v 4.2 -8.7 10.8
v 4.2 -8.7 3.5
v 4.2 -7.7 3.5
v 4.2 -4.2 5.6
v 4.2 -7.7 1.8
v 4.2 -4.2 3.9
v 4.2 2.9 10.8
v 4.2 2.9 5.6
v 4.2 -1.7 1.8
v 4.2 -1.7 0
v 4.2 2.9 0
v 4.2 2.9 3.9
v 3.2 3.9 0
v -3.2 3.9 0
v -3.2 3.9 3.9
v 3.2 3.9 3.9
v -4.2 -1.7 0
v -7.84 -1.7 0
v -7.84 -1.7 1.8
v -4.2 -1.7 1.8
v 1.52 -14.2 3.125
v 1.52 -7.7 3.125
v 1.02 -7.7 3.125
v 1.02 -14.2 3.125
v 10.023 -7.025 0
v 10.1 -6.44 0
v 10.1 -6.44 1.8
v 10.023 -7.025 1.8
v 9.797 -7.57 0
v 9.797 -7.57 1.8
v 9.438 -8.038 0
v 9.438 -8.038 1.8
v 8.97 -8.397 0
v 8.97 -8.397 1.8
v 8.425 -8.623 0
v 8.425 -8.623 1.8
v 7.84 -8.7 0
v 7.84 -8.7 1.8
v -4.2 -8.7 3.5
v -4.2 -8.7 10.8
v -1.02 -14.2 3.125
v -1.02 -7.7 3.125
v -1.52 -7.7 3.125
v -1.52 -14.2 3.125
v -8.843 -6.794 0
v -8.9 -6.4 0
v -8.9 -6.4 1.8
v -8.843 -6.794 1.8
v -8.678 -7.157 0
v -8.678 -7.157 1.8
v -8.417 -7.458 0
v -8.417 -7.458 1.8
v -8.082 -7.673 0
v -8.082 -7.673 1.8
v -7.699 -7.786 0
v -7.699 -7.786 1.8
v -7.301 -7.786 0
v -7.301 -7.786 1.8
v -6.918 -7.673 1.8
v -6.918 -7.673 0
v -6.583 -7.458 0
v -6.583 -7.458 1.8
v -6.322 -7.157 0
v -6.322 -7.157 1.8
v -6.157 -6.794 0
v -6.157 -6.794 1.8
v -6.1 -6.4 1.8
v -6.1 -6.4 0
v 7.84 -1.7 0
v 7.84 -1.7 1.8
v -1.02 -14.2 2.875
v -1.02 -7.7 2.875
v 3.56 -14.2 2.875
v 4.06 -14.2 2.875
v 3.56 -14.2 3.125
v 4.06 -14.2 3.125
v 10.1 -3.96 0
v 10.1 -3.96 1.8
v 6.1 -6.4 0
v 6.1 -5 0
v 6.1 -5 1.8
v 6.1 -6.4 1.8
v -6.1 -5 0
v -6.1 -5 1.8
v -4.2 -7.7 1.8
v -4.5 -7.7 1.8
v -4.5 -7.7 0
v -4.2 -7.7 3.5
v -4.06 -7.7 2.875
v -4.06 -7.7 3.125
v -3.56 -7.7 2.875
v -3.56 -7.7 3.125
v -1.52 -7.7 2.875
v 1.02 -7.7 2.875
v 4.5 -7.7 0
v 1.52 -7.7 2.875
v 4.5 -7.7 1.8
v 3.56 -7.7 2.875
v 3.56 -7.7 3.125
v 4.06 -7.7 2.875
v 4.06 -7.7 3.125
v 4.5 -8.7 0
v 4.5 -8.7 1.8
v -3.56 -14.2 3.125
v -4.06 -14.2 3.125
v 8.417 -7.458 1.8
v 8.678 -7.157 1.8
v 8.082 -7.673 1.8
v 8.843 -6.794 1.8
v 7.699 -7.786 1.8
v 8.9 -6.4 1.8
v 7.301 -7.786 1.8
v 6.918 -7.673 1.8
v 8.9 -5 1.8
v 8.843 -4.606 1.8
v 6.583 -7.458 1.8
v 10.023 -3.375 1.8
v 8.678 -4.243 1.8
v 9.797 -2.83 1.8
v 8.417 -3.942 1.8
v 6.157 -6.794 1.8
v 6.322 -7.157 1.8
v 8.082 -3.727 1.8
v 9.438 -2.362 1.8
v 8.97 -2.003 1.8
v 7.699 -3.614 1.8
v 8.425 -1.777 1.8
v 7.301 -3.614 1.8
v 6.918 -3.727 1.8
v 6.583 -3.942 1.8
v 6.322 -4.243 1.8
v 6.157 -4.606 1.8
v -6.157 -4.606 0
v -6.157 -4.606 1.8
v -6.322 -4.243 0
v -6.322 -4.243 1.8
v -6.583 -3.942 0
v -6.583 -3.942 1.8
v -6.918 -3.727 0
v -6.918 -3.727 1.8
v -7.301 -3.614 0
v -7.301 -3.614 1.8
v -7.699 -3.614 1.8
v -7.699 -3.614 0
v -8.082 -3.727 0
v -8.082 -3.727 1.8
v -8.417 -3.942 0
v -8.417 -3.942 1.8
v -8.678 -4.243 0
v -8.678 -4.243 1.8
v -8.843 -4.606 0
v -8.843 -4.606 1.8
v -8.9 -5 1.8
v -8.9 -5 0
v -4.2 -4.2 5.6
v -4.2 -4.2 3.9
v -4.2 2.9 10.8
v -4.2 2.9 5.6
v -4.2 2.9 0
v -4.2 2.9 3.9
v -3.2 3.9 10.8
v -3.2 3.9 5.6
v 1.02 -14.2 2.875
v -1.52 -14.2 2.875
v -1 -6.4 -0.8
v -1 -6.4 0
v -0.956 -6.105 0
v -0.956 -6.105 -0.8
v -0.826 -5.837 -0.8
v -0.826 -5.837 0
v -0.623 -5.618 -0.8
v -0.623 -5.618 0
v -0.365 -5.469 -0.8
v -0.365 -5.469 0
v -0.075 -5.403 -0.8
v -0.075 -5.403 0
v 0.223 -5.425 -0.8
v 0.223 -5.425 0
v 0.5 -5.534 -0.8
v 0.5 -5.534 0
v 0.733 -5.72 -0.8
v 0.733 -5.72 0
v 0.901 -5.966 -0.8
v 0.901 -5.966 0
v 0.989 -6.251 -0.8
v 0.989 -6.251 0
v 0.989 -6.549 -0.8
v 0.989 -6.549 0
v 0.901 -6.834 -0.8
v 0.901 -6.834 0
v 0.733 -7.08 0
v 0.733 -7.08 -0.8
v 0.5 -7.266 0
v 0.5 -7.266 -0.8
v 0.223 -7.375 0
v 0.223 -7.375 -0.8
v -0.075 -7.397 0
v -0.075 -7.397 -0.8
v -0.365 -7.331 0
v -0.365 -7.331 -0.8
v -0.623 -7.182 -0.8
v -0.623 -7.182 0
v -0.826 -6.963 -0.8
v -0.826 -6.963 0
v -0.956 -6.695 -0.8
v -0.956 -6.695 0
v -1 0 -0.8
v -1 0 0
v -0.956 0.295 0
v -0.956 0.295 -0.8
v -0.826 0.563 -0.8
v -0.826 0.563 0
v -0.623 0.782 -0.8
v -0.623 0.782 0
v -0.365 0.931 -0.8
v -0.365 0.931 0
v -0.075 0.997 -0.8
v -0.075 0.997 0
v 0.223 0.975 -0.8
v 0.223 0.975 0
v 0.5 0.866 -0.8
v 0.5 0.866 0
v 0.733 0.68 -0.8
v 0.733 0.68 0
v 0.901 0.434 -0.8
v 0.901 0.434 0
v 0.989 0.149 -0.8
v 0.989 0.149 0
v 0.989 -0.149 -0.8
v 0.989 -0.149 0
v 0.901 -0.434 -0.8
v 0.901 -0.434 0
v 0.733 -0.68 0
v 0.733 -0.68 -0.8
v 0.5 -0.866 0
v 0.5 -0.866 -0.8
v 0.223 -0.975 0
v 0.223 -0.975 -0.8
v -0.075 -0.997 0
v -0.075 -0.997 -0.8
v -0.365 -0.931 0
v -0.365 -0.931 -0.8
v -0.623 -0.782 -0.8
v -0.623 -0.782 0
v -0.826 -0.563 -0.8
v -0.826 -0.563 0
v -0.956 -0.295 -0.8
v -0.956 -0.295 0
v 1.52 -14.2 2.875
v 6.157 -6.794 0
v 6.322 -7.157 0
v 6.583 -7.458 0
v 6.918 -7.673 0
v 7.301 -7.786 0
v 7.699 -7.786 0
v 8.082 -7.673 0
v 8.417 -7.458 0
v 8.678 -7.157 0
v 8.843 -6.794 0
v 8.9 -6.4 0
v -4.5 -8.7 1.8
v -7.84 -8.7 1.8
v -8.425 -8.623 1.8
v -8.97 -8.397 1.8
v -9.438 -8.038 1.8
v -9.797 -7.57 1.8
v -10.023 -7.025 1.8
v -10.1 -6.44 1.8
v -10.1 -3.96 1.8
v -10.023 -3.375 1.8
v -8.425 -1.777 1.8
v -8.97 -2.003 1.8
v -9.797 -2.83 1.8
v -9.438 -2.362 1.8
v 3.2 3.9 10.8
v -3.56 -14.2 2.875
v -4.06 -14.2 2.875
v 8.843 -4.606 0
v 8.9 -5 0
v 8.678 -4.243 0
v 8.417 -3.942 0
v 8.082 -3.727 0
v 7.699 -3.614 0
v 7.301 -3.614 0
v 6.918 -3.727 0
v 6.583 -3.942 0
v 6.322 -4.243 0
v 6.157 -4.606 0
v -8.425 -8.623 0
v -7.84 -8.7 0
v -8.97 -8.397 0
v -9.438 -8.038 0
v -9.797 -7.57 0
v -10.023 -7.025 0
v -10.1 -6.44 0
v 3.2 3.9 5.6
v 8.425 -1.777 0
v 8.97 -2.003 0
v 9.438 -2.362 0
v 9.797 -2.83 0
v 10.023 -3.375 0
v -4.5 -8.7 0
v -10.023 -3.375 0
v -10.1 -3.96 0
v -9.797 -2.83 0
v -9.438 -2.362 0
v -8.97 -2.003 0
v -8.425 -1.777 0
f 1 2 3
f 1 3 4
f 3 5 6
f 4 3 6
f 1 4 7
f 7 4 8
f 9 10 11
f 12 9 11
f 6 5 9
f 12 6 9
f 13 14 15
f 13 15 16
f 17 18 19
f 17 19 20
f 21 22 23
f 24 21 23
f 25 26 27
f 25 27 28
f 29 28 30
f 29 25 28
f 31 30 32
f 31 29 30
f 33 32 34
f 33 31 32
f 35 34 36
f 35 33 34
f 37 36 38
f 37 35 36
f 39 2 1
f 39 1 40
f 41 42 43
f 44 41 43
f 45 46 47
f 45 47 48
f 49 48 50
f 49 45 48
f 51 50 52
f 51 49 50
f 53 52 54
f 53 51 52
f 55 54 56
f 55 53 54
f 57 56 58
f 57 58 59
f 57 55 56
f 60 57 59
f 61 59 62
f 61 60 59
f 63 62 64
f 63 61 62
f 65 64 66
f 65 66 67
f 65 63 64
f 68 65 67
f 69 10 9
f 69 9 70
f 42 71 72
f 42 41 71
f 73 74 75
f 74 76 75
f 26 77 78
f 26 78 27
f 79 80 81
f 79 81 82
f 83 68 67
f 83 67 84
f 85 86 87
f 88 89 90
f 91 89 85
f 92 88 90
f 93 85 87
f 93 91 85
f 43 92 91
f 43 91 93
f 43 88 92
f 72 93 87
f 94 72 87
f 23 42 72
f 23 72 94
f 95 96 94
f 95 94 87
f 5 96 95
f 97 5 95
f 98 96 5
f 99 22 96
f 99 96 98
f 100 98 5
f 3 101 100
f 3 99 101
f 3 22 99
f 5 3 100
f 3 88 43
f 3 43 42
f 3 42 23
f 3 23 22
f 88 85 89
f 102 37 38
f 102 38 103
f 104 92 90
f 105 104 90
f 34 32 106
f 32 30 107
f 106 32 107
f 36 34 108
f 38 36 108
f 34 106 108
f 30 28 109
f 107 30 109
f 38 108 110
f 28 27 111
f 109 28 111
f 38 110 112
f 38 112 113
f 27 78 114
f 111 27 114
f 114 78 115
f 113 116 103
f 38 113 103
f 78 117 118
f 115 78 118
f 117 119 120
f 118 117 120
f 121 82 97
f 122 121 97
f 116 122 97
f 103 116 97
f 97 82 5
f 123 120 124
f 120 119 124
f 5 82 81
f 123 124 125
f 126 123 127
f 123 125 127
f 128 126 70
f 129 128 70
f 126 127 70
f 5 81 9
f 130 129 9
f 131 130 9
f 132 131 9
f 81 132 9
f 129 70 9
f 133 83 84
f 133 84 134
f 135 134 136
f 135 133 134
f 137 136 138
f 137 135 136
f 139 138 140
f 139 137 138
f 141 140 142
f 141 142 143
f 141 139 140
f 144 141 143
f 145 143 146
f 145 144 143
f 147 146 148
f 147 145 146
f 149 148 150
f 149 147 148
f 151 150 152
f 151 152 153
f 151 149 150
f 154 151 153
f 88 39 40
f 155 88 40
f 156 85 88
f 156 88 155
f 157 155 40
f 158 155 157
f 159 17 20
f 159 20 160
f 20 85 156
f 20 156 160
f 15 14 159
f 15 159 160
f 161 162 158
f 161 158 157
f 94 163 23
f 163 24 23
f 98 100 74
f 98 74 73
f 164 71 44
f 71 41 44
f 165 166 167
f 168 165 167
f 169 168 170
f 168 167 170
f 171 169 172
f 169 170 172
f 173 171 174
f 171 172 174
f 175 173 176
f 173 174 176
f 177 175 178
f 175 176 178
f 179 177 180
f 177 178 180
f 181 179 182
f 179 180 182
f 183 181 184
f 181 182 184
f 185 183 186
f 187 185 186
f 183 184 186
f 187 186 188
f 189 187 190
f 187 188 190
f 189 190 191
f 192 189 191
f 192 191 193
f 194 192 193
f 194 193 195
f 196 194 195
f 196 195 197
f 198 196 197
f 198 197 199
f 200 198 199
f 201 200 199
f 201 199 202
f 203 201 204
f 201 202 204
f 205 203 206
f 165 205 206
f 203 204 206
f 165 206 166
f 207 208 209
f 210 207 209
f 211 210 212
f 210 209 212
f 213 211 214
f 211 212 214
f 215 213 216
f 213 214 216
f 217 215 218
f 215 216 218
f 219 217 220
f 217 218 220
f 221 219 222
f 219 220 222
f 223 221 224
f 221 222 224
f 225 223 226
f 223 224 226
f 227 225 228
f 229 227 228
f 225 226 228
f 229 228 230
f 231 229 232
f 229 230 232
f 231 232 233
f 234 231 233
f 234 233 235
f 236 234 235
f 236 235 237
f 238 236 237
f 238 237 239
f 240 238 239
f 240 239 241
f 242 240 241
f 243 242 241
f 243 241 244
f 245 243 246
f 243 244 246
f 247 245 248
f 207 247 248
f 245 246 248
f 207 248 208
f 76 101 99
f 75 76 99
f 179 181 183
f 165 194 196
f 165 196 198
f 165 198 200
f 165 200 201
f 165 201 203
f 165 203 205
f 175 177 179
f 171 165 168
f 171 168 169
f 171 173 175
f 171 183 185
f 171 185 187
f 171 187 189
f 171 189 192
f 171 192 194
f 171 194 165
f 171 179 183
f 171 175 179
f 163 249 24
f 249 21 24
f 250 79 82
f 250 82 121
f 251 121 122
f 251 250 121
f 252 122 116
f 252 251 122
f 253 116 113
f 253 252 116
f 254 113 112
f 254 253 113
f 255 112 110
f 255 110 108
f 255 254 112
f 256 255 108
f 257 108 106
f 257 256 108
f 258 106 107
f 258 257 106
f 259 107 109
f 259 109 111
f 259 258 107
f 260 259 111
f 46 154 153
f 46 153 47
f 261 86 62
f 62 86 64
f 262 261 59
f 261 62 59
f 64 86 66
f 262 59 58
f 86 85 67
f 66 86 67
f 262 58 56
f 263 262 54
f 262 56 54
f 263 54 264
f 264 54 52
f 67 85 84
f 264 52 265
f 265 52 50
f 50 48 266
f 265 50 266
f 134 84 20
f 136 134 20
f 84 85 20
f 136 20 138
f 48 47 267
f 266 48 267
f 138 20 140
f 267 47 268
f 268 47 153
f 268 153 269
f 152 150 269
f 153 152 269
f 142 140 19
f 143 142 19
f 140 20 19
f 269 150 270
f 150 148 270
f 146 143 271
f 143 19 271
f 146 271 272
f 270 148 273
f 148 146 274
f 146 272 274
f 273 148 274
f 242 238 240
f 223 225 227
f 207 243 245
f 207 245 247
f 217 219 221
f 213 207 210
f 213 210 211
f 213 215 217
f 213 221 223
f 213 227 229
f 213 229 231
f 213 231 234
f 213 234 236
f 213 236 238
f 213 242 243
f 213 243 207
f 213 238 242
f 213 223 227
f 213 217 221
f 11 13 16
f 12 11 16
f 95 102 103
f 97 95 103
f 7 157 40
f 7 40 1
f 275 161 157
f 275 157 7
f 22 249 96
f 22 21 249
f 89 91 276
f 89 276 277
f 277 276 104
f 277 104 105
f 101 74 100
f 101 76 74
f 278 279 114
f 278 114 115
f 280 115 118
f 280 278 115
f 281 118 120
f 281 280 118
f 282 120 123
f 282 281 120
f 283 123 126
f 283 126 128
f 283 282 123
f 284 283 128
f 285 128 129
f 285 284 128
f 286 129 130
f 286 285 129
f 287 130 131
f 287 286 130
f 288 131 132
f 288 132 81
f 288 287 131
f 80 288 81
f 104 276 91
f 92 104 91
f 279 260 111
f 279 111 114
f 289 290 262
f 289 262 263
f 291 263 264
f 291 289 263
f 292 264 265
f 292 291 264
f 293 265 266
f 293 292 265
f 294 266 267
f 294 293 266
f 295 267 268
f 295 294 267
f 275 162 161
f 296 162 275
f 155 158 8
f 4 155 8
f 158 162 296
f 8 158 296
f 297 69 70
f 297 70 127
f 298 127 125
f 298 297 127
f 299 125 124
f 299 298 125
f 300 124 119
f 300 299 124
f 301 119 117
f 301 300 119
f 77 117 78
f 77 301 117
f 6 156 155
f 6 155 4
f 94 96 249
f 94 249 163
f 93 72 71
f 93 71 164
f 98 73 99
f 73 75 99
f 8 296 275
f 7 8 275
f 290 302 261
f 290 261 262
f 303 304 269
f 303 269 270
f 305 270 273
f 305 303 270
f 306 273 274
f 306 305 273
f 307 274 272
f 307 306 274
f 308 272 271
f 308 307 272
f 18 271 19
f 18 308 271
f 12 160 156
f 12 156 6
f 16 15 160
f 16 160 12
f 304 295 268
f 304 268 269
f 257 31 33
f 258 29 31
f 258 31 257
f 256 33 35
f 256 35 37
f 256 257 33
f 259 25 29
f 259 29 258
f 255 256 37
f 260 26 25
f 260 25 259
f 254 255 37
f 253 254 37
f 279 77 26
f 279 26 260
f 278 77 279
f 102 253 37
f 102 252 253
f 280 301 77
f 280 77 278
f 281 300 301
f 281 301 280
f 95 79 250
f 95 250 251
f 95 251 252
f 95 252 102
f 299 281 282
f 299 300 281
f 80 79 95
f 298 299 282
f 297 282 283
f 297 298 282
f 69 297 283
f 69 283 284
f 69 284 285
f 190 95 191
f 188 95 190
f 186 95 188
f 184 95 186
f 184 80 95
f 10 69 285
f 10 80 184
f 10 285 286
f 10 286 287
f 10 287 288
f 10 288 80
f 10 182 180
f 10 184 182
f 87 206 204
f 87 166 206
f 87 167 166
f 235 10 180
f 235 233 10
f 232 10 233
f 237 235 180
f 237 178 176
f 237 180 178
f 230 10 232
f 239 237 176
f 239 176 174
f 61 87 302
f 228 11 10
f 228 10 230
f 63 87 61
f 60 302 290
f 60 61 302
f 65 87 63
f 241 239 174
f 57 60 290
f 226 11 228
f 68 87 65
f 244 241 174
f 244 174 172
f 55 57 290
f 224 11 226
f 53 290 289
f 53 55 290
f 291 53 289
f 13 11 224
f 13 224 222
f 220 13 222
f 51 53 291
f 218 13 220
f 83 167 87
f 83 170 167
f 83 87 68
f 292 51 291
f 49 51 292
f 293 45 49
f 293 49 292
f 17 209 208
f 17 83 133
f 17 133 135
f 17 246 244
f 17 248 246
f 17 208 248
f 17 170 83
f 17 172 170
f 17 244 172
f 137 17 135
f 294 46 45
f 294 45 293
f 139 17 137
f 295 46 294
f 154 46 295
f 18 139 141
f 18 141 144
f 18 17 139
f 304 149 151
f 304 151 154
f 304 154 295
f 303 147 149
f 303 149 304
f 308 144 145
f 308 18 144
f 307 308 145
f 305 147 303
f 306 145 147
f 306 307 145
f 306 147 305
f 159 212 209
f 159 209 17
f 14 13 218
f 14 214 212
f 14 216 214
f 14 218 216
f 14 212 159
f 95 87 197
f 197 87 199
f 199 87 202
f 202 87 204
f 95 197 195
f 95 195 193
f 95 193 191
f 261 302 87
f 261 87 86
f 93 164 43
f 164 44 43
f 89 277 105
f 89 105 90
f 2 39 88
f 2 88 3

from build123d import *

# Parameters (mm, degrees)
SKETCH1_W           = 8.4
SKETCH1_H           = 12.6
BOSS_EXTRUDE1_DEPTH = 10.8
CHAMFER1_SIZE       = 1
BOSS_EXTRUDE2_DEPTH = 1.8
SKETCH3_W           = 8.4
SKETCH3_H           = 1.7
CUT_EXTRUDE1_DEPTH  = 8.1
SKETCH4_R           = 1
BOSS_EXTRUDE3_DEPTH = 0.8
SKETCH5_W           = 9
SKETCH5_H           = 3.5
CUT_EXTRUDE2_DEPTH  = 1
SKETCH6_W           = 0.5
SKETCH6_H           = 6.5
BOSS_EXTRUDE4_DEPTH = 0.125


with BuildPart() as part:
    # Sketch1 → Boss-Extrude1 (new body)
    with BuildSketch(Plane.XY):
        with Locations((0, -2.4)):
            Rectangle(SKETCH1_W, SKETCH1_H)
    extrude(amount=BOSS_EXTRUDE1_DEPTH)

    # Chamfer1
    chamfer1_edges = [part.edges().sort_by_distance(p)[0] for p in [
        (-4.2, 3.9, 5.4),
        (4.2, 3.9, 5.4),
    ]]
    chamfer(chamfer1_edges, length=CHAMFER1_SIZE)

    # Sketch2 → Boss-Extrude2 (add)
    with BuildSketch(Plane(origin=(0, 0, 0), x_dir=(-1, 0, 0), z_dir=(0, 0, -1))):
        with BuildLine():
            Line((-7.84, -8.7), (7.84, -8.7))
            ThreePointArc((7.84, -8.7), (9.438061325, -8.038061325), (10.1, -6.44))
            Line((10.1, -6.44), (10.1, -3.96))
            ThreePointArc((10.1, -3.96), (9.438061325, -2.361938675), (7.84, -1.7))
            Line((7.84, -1.7), (-7.84, -1.7))
            ThreePointArc((-7.84, -1.7), (-9.438061325, -2.361938675), (-10.1, -3.96))
            Line((-10.1, -3.96), (-10.1, -6.44))
            ThreePointArc((-10.1, -6.44), (-9.438061325, -8.038061325), (-7.84, -8.7))
        make_face()
        with BuildLine():
            Line((-6.1, -5), (-6.1, -6.4))
            ThreePointArc((-6.1, -6.4), (-7.5, -7.8), (-8.9, -6.4))
            Line((-8.9, -6.4), (-8.9, -5))
            ThreePointArc((-8.9, -5), (-7.5, -3.6), (-6.1, -5))
        make_face(mode=Mode.SUBTRACT)
        with BuildLine():
            Line((8.9, -5), (8.9, -6.4))
            ThreePointArc((8.9, -6.4), (7.5, -7.8), (6.1, -6.4))
            Line((6.1, -6.4), (6.1, -5))
            ThreePointArc((6.1, -5), (7.5, -3.6), (8.9, -5))
        make_face(mode=Mode.SUBTRACT)
    extrude(amount=-BOSS_EXTRUDE2_DEPTH)

    # Sketch3 → Cut-Extrude1 (cut)
    with BuildSketch(Plane(origin=(0, 3.9, 0), x_dir=(1, 0, 0), z_dir=(0, 1, 0))):
        with Locations((0, -4.75)):
            Rectangle(SKETCH3_W, SKETCH3_H)
    extrude(amount=-CUT_EXTRUDE1_DEPTH, mode=Mode.SUBTRACT)

    # Sketch4 → Boss-Extrude3 (add)
    with BuildSketch(Plane(origin=(0, 0, 0), x_dir=(-1, 0, 0), z_dir=(0, 0, -1))):
        Circle(SKETCH4_R)
        with Locations((0, -6.4)):
            Circle(SKETCH4_R)
    extrude(amount=BOSS_EXTRUDE3_DEPTH)

    # Sketch5 → Cut-Extrude2 (cut)
    with BuildSketch(Plane.XZ.offset(8.7)):
        with Locations((0, 1.75)):
            Rectangle(SKETCH5_W, SKETCH5_H)
    extrude(amount=-CUT_EXTRUDE2_DEPTH, mode=Mode.SUBTRACT)

    # Sketch6 → Boss-Extrude4 (add, symmetric)
    with BuildSketch(Plane(origin=(0, 0, 3), x_dir=(-1, 0, 0), z_dir=(0, 0, -1))):
        with Locations((-3.81, -10.95)):
            Rectangle(SKETCH6_W, SKETCH6_H)
        with Locations((-1.27, -10.95)):
            Rectangle(SKETCH6_W, SKETCH6_H)
        with Locations((1.27, -10.95)):
            Rectangle(SKETCH6_W, SKETCH6_H)
        with Locations((3.81, -10.95)):
            Rectangle(SKETCH6_W, SKETCH6_H)
    extrude(amount=BOSS_EXTRUDE4_DEPTH, both=True)


solid = part.part
